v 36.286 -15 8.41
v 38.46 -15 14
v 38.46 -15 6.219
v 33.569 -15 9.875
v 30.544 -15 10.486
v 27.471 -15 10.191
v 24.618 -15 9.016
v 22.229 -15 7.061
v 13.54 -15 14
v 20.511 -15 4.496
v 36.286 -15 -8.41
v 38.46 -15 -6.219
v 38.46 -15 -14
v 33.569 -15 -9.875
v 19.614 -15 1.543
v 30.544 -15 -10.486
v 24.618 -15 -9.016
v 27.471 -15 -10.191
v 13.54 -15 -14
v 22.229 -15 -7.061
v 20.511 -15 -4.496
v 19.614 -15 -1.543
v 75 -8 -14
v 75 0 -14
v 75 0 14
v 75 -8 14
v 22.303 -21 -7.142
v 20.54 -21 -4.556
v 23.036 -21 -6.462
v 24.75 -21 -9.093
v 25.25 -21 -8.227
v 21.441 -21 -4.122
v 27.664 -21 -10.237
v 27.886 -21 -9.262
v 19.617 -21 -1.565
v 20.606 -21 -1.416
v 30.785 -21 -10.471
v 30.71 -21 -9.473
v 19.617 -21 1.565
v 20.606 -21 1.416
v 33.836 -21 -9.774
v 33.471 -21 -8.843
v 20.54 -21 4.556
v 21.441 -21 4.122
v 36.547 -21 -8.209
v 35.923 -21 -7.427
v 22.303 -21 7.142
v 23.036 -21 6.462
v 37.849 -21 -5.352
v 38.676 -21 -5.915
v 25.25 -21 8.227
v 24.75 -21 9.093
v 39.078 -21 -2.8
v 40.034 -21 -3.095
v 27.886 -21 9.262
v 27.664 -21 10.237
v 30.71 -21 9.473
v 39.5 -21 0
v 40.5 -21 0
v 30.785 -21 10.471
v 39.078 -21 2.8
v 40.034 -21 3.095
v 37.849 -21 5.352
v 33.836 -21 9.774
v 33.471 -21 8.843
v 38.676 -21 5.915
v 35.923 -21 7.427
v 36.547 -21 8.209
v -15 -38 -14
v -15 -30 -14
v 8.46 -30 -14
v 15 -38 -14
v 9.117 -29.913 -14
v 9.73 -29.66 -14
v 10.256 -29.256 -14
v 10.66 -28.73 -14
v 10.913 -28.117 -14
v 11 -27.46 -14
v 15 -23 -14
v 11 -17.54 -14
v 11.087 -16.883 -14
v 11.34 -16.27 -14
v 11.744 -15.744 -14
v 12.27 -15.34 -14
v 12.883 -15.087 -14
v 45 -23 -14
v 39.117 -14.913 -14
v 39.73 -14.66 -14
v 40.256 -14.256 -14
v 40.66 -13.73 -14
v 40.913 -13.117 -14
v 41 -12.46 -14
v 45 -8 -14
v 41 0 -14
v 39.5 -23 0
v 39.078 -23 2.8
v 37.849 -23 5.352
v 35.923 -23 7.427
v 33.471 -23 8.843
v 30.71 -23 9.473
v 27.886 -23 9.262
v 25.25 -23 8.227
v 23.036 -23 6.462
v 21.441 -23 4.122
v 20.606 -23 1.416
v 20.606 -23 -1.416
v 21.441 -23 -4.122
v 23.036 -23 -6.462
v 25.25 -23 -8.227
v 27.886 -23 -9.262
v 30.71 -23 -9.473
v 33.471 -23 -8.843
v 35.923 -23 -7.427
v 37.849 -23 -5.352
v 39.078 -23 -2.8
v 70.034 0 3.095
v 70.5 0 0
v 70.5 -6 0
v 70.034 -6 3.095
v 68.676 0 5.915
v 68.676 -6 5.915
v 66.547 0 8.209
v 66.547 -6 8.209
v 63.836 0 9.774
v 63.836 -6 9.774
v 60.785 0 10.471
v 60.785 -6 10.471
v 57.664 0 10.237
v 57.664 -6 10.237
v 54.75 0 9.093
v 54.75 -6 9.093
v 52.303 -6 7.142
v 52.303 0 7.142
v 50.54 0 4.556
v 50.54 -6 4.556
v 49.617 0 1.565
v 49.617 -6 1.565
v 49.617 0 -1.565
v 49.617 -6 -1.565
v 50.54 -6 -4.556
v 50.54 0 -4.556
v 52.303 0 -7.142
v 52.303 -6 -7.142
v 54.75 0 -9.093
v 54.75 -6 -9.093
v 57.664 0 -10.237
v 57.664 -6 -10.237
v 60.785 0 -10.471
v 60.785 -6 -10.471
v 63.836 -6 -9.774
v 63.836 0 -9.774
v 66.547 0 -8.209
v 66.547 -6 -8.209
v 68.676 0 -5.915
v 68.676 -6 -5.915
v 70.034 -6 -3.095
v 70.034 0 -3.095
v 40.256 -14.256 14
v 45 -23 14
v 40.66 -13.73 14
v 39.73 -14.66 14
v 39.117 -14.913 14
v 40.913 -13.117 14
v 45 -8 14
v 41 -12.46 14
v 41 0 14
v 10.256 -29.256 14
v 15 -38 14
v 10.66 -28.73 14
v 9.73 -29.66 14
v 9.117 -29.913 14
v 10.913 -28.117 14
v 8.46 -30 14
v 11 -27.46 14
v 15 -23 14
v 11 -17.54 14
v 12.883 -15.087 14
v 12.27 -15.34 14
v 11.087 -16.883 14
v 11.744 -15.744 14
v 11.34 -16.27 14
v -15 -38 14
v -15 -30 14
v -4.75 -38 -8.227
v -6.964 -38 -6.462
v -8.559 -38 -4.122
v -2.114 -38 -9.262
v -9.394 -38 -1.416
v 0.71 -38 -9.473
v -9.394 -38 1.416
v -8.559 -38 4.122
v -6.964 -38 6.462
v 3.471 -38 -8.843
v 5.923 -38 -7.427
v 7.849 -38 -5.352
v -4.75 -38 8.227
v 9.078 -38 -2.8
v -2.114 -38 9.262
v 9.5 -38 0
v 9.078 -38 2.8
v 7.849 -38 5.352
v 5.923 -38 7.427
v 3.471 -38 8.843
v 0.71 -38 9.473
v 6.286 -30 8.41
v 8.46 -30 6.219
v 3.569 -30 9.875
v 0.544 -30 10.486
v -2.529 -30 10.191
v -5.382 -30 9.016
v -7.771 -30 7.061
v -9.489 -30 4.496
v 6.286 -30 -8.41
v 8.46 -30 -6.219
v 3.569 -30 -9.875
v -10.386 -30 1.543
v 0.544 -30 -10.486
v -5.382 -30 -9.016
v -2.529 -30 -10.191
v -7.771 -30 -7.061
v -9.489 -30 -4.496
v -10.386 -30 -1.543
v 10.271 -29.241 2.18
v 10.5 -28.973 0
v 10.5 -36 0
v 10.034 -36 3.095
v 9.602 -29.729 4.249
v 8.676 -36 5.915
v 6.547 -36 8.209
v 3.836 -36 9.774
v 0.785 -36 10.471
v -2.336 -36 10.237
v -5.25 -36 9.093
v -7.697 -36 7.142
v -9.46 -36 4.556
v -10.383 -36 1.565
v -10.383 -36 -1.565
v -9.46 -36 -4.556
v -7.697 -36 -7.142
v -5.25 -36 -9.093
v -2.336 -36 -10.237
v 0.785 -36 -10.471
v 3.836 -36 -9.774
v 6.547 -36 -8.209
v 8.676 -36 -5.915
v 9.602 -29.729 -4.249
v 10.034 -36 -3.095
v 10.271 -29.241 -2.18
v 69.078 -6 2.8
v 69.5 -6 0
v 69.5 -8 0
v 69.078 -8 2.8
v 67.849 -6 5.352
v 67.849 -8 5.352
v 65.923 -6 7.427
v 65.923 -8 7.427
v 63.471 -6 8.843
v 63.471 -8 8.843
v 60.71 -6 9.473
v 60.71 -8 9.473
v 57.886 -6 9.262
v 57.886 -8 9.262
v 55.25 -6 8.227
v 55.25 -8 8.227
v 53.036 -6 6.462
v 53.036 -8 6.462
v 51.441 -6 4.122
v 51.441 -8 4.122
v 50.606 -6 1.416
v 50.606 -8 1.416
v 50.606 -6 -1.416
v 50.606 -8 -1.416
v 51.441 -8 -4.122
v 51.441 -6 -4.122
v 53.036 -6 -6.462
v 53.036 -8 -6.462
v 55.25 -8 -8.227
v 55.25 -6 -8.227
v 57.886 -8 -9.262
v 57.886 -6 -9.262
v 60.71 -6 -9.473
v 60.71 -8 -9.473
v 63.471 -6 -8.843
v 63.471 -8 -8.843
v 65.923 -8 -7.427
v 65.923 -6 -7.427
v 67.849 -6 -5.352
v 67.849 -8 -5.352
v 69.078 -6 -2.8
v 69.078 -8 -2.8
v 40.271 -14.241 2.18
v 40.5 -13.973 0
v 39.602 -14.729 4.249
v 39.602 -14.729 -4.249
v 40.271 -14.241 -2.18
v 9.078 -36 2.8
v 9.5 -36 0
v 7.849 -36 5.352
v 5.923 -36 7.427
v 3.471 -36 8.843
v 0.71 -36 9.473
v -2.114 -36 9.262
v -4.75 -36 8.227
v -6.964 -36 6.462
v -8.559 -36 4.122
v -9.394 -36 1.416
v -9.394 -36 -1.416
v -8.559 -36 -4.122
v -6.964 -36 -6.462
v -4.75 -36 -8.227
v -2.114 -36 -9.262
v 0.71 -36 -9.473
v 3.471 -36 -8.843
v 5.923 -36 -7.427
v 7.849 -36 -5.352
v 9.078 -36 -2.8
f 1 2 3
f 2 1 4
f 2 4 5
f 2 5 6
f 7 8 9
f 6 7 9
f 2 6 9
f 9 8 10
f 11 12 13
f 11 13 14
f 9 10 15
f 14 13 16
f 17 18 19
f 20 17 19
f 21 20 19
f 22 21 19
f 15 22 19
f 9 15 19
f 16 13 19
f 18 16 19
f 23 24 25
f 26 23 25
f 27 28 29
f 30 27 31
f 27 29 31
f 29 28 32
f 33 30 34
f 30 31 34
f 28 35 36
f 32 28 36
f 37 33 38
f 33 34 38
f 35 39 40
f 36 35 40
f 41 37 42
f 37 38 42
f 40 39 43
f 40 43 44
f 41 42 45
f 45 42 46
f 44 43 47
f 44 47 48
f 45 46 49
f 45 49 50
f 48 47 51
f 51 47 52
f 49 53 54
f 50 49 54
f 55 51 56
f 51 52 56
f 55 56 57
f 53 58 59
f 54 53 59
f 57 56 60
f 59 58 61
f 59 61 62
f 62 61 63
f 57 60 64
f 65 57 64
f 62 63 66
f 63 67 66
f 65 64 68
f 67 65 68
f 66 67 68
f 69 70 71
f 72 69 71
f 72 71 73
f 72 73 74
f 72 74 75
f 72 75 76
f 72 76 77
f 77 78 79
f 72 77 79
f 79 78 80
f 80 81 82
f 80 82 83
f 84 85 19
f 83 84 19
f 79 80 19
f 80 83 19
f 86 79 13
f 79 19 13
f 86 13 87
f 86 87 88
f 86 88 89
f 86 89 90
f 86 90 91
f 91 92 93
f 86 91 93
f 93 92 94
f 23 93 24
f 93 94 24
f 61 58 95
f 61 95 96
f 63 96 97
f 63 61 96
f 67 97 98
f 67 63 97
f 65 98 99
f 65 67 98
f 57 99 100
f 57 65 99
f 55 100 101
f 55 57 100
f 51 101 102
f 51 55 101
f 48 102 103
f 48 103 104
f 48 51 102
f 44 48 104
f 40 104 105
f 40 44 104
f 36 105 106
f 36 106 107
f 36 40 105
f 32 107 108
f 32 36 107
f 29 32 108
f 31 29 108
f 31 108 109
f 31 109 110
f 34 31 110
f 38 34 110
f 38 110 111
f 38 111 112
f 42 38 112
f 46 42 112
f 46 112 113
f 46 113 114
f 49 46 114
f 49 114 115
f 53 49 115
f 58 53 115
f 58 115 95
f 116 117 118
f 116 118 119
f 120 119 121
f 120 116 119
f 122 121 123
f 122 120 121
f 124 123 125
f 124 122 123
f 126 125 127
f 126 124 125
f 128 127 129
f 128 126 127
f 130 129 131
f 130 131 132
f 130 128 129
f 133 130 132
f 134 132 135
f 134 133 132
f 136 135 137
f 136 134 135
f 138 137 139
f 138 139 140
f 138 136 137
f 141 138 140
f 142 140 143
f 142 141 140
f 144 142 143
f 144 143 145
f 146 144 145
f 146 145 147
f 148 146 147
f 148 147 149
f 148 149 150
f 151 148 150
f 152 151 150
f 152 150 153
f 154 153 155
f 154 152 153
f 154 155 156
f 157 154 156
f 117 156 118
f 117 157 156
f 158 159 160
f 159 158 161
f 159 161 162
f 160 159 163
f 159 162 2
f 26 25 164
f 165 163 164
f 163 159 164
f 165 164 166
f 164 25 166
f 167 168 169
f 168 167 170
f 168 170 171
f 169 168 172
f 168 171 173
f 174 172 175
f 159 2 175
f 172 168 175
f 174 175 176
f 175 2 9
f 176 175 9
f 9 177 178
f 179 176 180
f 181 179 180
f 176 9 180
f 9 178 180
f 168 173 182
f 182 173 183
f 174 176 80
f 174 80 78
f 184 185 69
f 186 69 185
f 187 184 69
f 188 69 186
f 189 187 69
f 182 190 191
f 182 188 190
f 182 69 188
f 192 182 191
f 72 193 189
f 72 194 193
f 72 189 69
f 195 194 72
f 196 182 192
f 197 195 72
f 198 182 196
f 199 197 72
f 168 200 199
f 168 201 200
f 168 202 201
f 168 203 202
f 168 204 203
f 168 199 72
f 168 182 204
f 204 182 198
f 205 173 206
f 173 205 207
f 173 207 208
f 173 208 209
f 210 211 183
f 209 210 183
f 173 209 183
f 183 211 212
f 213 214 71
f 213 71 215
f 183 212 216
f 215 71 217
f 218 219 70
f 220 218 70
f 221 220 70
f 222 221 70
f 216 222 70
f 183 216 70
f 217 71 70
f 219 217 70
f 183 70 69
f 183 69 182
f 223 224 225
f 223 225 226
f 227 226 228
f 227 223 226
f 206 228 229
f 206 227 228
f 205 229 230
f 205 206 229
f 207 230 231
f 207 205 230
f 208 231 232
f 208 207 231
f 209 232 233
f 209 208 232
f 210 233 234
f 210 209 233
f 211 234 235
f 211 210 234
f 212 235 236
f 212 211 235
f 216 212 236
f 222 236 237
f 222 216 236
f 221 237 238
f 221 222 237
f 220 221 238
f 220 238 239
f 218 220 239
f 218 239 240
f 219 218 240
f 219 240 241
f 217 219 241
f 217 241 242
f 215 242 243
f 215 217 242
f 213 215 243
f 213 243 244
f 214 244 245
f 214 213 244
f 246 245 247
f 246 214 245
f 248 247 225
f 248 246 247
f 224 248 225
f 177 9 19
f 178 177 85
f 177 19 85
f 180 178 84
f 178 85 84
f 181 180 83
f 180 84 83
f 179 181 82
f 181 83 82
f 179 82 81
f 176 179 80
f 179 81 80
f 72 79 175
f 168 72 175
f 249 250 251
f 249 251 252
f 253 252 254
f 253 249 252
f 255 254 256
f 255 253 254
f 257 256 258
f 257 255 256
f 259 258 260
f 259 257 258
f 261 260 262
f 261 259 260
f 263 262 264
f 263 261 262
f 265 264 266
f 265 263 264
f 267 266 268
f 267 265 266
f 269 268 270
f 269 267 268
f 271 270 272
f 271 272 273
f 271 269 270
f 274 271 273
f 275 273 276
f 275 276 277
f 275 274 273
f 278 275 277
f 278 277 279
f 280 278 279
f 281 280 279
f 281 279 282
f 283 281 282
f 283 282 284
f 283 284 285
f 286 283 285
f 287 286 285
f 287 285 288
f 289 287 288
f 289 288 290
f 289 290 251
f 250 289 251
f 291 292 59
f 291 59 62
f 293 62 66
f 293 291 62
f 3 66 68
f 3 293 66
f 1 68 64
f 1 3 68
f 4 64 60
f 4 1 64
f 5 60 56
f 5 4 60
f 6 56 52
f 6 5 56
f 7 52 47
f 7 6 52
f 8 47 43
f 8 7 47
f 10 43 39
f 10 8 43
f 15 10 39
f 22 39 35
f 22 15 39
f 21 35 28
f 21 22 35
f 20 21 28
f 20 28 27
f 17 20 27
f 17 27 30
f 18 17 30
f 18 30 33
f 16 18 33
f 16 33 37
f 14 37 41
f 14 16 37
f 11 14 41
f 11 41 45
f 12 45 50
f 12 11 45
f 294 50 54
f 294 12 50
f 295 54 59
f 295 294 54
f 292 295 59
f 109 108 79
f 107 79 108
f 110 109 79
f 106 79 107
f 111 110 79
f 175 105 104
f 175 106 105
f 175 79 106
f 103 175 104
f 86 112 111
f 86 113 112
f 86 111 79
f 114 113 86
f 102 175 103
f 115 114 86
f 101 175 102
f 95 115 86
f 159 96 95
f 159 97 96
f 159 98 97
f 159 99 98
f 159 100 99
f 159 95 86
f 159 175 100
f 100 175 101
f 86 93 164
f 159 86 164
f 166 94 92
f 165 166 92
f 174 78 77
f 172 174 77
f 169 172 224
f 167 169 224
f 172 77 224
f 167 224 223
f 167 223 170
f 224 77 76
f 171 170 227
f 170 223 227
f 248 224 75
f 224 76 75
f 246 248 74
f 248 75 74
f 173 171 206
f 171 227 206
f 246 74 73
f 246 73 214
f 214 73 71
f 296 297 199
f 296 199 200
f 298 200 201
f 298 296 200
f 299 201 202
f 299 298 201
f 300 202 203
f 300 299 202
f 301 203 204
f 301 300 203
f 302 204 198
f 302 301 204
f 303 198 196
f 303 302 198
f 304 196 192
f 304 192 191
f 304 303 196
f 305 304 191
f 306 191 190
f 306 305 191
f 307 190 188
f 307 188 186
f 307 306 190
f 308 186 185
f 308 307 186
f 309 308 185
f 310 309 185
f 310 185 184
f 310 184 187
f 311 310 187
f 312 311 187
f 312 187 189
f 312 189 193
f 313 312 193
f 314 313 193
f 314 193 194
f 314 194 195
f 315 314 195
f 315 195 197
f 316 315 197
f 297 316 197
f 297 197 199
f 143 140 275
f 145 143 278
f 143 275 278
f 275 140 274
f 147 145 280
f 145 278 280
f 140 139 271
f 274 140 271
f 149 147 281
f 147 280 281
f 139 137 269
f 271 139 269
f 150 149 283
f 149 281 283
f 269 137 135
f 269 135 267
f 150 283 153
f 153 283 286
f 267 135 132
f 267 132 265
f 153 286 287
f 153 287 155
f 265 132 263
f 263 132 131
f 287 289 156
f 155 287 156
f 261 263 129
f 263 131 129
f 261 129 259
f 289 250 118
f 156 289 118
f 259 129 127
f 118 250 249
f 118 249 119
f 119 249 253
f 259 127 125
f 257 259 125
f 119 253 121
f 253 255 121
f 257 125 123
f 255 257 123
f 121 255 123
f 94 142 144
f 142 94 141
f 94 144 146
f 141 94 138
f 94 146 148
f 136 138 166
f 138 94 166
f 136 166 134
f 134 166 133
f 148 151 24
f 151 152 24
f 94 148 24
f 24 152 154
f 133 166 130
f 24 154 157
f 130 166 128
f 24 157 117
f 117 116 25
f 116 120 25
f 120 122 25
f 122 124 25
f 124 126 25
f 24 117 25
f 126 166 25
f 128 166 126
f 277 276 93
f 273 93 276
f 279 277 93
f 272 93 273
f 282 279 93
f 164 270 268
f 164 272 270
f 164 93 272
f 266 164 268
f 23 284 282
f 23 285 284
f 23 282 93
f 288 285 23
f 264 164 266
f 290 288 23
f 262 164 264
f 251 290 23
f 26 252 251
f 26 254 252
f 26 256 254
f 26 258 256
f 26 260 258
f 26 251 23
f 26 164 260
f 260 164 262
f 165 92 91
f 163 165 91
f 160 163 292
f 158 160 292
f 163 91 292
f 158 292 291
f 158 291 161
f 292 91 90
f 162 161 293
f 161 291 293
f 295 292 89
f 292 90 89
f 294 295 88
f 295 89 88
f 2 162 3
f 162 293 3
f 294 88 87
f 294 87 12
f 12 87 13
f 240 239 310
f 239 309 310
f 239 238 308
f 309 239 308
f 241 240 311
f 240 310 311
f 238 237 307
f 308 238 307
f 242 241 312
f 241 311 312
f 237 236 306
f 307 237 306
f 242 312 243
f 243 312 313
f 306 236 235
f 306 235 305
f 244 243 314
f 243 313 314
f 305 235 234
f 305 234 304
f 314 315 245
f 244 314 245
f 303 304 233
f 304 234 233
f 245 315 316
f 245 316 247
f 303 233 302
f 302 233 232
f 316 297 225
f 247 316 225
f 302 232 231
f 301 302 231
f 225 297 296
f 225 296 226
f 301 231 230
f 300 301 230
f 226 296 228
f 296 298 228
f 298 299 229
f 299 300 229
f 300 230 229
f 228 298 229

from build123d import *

# Parameters (mm, degrees)
F0_W     = 30
F0_H     = 28
F0_R     = 10.5
F0_R_2   = 9.5
F1_DEPTH = 8
F2_DEPTH = 38
F3_DEPTH = 23
F4_DEPTH = 36
F5_DEPTH = 21
F6_DEPTH = 6
F8_DEPTH = 28.001


with BuildPart() as f1:
    # F0 (on Front) → F1 (new body)
    with BuildSketch(Plane.XZ):
        with Locations((60, 0)):
            Rectangle(F0_W, F0_H)
        with Locations((60, 0)):
            Circle(F0_R, mode=Mode.SUBTRACT)
        with Locations((30, 0)):
            Rectangle(F0_W, F0_H)
        with Locations((30, 0)):
            Circle(F0_R, mode=Mode.SUBTRACT)
        Rectangle(F0_W, F0_H)
        Circle(F0_R, mode=Mode.SUBTRACT)
        Circle(F0_R)
        Circle(F0_R_2, mode=Mode.SUBTRACT)
        with Locations((60, 0)):
            Circle(F0_R)
        with Locations((60, 0)):
            Circle(F0_R_2, mode=Mode.SUBTRACT)
        with Locations((30, 0)):
            Circle(F0_R)
        with Locations((30, 0)):
            Circle(F0_R_2, mode=Mode.SUBTRACT)
    extrude(amount=F1_DEPTH)

    # F0 (on Front) → F2 (join)
    with BuildSketch(Plane.XZ):
        Rectangle(F0_W, F0_H)
        Circle(F0_R, mode=Mode.SUBTRACT)
        Circle(F0_R)
        Circle(F0_R_2, mode=Mode.SUBTRACT)
    extrude(amount=F2_DEPTH)

    # F0 (on Front) → F3 (join)
    with BuildSketch(Plane.XZ):
        with Locations((30, 0)):
            Rectangle(F0_W, F0_H)
        with Locations((30, 0)):
            Circle(F0_R, mode=Mode.SUBTRACT)
        with Locations((30, 0)):
            Circle(F0_R)
        with Locations((30, 0)):
            Circle(F0_R_2, mode=Mode.SUBTRACT)
    extrude(amount=F3_DEPTH)

    # F0 (on Front) → F4 (cut)
    with BuildSketch(Plane.XZ):
        Circle(F0_R)
        Circle(F0_R_2, mode=Mode.SUBTRACT)
    extrude(amount=F4_DEPTH, mode=Mode.SUBTRACT)

    # F0 (on Front) → F5 (cut)
    with BuildSketch(Plane.XZ):
        with Locations((30, 0)):
            Circle(F0_R)
        with Locations((30, 0)):
            Circle(F0_R_2, mode=Mode.SUBTRACT)
    extrude(amount=F5_DEPTH, mode=Mode.SUBTRACT)

    # F0 (on Front) → F6 (cut)
    with BuildSketch(Plane.XZ):
        with Locations((60, 0)):
            Circle(F0_R)
        with Locations((60, 0)):
            Circle(F0_R_2, mode=Mode.SUBTRACT)
    extrude(amount=F6_DEPTH, mode=Mode.SUBTRACT)

    # F7 (on face) → F8 (cut, through all)
    with BuildSketch(Plane(origin=(0, 0, -14), x_dir=(1, 0, 0), z_dir=(0, 0, -1))):
        with BuildLine():
            Line((8.46, 30), (-15, 30))
            Line((-15, 30), (-15, 0))
            Line((-15, 0), (41, 0))
            Line((41, 0), (41, 12.46))
            ThreePointArc((41, 12.46), (40.2560512242, 14.2560512242), (38.46, 15))
            Line((38.46, 15), (13.54, 15))
            ThreePointArc((13.54, 15), (11.7439487758, 15.7439487758), (11, 17.54))
            Line((11, 17.54), (11, 27.46))
            ThreePointArc((11, 27.46), (10.2560512242, 29.2560512242), (8.46, 30))
        make_face()
    extrude(amount=-F8_DEPTH, mode=Mode.SUBTRACT)


solid = f1.part
